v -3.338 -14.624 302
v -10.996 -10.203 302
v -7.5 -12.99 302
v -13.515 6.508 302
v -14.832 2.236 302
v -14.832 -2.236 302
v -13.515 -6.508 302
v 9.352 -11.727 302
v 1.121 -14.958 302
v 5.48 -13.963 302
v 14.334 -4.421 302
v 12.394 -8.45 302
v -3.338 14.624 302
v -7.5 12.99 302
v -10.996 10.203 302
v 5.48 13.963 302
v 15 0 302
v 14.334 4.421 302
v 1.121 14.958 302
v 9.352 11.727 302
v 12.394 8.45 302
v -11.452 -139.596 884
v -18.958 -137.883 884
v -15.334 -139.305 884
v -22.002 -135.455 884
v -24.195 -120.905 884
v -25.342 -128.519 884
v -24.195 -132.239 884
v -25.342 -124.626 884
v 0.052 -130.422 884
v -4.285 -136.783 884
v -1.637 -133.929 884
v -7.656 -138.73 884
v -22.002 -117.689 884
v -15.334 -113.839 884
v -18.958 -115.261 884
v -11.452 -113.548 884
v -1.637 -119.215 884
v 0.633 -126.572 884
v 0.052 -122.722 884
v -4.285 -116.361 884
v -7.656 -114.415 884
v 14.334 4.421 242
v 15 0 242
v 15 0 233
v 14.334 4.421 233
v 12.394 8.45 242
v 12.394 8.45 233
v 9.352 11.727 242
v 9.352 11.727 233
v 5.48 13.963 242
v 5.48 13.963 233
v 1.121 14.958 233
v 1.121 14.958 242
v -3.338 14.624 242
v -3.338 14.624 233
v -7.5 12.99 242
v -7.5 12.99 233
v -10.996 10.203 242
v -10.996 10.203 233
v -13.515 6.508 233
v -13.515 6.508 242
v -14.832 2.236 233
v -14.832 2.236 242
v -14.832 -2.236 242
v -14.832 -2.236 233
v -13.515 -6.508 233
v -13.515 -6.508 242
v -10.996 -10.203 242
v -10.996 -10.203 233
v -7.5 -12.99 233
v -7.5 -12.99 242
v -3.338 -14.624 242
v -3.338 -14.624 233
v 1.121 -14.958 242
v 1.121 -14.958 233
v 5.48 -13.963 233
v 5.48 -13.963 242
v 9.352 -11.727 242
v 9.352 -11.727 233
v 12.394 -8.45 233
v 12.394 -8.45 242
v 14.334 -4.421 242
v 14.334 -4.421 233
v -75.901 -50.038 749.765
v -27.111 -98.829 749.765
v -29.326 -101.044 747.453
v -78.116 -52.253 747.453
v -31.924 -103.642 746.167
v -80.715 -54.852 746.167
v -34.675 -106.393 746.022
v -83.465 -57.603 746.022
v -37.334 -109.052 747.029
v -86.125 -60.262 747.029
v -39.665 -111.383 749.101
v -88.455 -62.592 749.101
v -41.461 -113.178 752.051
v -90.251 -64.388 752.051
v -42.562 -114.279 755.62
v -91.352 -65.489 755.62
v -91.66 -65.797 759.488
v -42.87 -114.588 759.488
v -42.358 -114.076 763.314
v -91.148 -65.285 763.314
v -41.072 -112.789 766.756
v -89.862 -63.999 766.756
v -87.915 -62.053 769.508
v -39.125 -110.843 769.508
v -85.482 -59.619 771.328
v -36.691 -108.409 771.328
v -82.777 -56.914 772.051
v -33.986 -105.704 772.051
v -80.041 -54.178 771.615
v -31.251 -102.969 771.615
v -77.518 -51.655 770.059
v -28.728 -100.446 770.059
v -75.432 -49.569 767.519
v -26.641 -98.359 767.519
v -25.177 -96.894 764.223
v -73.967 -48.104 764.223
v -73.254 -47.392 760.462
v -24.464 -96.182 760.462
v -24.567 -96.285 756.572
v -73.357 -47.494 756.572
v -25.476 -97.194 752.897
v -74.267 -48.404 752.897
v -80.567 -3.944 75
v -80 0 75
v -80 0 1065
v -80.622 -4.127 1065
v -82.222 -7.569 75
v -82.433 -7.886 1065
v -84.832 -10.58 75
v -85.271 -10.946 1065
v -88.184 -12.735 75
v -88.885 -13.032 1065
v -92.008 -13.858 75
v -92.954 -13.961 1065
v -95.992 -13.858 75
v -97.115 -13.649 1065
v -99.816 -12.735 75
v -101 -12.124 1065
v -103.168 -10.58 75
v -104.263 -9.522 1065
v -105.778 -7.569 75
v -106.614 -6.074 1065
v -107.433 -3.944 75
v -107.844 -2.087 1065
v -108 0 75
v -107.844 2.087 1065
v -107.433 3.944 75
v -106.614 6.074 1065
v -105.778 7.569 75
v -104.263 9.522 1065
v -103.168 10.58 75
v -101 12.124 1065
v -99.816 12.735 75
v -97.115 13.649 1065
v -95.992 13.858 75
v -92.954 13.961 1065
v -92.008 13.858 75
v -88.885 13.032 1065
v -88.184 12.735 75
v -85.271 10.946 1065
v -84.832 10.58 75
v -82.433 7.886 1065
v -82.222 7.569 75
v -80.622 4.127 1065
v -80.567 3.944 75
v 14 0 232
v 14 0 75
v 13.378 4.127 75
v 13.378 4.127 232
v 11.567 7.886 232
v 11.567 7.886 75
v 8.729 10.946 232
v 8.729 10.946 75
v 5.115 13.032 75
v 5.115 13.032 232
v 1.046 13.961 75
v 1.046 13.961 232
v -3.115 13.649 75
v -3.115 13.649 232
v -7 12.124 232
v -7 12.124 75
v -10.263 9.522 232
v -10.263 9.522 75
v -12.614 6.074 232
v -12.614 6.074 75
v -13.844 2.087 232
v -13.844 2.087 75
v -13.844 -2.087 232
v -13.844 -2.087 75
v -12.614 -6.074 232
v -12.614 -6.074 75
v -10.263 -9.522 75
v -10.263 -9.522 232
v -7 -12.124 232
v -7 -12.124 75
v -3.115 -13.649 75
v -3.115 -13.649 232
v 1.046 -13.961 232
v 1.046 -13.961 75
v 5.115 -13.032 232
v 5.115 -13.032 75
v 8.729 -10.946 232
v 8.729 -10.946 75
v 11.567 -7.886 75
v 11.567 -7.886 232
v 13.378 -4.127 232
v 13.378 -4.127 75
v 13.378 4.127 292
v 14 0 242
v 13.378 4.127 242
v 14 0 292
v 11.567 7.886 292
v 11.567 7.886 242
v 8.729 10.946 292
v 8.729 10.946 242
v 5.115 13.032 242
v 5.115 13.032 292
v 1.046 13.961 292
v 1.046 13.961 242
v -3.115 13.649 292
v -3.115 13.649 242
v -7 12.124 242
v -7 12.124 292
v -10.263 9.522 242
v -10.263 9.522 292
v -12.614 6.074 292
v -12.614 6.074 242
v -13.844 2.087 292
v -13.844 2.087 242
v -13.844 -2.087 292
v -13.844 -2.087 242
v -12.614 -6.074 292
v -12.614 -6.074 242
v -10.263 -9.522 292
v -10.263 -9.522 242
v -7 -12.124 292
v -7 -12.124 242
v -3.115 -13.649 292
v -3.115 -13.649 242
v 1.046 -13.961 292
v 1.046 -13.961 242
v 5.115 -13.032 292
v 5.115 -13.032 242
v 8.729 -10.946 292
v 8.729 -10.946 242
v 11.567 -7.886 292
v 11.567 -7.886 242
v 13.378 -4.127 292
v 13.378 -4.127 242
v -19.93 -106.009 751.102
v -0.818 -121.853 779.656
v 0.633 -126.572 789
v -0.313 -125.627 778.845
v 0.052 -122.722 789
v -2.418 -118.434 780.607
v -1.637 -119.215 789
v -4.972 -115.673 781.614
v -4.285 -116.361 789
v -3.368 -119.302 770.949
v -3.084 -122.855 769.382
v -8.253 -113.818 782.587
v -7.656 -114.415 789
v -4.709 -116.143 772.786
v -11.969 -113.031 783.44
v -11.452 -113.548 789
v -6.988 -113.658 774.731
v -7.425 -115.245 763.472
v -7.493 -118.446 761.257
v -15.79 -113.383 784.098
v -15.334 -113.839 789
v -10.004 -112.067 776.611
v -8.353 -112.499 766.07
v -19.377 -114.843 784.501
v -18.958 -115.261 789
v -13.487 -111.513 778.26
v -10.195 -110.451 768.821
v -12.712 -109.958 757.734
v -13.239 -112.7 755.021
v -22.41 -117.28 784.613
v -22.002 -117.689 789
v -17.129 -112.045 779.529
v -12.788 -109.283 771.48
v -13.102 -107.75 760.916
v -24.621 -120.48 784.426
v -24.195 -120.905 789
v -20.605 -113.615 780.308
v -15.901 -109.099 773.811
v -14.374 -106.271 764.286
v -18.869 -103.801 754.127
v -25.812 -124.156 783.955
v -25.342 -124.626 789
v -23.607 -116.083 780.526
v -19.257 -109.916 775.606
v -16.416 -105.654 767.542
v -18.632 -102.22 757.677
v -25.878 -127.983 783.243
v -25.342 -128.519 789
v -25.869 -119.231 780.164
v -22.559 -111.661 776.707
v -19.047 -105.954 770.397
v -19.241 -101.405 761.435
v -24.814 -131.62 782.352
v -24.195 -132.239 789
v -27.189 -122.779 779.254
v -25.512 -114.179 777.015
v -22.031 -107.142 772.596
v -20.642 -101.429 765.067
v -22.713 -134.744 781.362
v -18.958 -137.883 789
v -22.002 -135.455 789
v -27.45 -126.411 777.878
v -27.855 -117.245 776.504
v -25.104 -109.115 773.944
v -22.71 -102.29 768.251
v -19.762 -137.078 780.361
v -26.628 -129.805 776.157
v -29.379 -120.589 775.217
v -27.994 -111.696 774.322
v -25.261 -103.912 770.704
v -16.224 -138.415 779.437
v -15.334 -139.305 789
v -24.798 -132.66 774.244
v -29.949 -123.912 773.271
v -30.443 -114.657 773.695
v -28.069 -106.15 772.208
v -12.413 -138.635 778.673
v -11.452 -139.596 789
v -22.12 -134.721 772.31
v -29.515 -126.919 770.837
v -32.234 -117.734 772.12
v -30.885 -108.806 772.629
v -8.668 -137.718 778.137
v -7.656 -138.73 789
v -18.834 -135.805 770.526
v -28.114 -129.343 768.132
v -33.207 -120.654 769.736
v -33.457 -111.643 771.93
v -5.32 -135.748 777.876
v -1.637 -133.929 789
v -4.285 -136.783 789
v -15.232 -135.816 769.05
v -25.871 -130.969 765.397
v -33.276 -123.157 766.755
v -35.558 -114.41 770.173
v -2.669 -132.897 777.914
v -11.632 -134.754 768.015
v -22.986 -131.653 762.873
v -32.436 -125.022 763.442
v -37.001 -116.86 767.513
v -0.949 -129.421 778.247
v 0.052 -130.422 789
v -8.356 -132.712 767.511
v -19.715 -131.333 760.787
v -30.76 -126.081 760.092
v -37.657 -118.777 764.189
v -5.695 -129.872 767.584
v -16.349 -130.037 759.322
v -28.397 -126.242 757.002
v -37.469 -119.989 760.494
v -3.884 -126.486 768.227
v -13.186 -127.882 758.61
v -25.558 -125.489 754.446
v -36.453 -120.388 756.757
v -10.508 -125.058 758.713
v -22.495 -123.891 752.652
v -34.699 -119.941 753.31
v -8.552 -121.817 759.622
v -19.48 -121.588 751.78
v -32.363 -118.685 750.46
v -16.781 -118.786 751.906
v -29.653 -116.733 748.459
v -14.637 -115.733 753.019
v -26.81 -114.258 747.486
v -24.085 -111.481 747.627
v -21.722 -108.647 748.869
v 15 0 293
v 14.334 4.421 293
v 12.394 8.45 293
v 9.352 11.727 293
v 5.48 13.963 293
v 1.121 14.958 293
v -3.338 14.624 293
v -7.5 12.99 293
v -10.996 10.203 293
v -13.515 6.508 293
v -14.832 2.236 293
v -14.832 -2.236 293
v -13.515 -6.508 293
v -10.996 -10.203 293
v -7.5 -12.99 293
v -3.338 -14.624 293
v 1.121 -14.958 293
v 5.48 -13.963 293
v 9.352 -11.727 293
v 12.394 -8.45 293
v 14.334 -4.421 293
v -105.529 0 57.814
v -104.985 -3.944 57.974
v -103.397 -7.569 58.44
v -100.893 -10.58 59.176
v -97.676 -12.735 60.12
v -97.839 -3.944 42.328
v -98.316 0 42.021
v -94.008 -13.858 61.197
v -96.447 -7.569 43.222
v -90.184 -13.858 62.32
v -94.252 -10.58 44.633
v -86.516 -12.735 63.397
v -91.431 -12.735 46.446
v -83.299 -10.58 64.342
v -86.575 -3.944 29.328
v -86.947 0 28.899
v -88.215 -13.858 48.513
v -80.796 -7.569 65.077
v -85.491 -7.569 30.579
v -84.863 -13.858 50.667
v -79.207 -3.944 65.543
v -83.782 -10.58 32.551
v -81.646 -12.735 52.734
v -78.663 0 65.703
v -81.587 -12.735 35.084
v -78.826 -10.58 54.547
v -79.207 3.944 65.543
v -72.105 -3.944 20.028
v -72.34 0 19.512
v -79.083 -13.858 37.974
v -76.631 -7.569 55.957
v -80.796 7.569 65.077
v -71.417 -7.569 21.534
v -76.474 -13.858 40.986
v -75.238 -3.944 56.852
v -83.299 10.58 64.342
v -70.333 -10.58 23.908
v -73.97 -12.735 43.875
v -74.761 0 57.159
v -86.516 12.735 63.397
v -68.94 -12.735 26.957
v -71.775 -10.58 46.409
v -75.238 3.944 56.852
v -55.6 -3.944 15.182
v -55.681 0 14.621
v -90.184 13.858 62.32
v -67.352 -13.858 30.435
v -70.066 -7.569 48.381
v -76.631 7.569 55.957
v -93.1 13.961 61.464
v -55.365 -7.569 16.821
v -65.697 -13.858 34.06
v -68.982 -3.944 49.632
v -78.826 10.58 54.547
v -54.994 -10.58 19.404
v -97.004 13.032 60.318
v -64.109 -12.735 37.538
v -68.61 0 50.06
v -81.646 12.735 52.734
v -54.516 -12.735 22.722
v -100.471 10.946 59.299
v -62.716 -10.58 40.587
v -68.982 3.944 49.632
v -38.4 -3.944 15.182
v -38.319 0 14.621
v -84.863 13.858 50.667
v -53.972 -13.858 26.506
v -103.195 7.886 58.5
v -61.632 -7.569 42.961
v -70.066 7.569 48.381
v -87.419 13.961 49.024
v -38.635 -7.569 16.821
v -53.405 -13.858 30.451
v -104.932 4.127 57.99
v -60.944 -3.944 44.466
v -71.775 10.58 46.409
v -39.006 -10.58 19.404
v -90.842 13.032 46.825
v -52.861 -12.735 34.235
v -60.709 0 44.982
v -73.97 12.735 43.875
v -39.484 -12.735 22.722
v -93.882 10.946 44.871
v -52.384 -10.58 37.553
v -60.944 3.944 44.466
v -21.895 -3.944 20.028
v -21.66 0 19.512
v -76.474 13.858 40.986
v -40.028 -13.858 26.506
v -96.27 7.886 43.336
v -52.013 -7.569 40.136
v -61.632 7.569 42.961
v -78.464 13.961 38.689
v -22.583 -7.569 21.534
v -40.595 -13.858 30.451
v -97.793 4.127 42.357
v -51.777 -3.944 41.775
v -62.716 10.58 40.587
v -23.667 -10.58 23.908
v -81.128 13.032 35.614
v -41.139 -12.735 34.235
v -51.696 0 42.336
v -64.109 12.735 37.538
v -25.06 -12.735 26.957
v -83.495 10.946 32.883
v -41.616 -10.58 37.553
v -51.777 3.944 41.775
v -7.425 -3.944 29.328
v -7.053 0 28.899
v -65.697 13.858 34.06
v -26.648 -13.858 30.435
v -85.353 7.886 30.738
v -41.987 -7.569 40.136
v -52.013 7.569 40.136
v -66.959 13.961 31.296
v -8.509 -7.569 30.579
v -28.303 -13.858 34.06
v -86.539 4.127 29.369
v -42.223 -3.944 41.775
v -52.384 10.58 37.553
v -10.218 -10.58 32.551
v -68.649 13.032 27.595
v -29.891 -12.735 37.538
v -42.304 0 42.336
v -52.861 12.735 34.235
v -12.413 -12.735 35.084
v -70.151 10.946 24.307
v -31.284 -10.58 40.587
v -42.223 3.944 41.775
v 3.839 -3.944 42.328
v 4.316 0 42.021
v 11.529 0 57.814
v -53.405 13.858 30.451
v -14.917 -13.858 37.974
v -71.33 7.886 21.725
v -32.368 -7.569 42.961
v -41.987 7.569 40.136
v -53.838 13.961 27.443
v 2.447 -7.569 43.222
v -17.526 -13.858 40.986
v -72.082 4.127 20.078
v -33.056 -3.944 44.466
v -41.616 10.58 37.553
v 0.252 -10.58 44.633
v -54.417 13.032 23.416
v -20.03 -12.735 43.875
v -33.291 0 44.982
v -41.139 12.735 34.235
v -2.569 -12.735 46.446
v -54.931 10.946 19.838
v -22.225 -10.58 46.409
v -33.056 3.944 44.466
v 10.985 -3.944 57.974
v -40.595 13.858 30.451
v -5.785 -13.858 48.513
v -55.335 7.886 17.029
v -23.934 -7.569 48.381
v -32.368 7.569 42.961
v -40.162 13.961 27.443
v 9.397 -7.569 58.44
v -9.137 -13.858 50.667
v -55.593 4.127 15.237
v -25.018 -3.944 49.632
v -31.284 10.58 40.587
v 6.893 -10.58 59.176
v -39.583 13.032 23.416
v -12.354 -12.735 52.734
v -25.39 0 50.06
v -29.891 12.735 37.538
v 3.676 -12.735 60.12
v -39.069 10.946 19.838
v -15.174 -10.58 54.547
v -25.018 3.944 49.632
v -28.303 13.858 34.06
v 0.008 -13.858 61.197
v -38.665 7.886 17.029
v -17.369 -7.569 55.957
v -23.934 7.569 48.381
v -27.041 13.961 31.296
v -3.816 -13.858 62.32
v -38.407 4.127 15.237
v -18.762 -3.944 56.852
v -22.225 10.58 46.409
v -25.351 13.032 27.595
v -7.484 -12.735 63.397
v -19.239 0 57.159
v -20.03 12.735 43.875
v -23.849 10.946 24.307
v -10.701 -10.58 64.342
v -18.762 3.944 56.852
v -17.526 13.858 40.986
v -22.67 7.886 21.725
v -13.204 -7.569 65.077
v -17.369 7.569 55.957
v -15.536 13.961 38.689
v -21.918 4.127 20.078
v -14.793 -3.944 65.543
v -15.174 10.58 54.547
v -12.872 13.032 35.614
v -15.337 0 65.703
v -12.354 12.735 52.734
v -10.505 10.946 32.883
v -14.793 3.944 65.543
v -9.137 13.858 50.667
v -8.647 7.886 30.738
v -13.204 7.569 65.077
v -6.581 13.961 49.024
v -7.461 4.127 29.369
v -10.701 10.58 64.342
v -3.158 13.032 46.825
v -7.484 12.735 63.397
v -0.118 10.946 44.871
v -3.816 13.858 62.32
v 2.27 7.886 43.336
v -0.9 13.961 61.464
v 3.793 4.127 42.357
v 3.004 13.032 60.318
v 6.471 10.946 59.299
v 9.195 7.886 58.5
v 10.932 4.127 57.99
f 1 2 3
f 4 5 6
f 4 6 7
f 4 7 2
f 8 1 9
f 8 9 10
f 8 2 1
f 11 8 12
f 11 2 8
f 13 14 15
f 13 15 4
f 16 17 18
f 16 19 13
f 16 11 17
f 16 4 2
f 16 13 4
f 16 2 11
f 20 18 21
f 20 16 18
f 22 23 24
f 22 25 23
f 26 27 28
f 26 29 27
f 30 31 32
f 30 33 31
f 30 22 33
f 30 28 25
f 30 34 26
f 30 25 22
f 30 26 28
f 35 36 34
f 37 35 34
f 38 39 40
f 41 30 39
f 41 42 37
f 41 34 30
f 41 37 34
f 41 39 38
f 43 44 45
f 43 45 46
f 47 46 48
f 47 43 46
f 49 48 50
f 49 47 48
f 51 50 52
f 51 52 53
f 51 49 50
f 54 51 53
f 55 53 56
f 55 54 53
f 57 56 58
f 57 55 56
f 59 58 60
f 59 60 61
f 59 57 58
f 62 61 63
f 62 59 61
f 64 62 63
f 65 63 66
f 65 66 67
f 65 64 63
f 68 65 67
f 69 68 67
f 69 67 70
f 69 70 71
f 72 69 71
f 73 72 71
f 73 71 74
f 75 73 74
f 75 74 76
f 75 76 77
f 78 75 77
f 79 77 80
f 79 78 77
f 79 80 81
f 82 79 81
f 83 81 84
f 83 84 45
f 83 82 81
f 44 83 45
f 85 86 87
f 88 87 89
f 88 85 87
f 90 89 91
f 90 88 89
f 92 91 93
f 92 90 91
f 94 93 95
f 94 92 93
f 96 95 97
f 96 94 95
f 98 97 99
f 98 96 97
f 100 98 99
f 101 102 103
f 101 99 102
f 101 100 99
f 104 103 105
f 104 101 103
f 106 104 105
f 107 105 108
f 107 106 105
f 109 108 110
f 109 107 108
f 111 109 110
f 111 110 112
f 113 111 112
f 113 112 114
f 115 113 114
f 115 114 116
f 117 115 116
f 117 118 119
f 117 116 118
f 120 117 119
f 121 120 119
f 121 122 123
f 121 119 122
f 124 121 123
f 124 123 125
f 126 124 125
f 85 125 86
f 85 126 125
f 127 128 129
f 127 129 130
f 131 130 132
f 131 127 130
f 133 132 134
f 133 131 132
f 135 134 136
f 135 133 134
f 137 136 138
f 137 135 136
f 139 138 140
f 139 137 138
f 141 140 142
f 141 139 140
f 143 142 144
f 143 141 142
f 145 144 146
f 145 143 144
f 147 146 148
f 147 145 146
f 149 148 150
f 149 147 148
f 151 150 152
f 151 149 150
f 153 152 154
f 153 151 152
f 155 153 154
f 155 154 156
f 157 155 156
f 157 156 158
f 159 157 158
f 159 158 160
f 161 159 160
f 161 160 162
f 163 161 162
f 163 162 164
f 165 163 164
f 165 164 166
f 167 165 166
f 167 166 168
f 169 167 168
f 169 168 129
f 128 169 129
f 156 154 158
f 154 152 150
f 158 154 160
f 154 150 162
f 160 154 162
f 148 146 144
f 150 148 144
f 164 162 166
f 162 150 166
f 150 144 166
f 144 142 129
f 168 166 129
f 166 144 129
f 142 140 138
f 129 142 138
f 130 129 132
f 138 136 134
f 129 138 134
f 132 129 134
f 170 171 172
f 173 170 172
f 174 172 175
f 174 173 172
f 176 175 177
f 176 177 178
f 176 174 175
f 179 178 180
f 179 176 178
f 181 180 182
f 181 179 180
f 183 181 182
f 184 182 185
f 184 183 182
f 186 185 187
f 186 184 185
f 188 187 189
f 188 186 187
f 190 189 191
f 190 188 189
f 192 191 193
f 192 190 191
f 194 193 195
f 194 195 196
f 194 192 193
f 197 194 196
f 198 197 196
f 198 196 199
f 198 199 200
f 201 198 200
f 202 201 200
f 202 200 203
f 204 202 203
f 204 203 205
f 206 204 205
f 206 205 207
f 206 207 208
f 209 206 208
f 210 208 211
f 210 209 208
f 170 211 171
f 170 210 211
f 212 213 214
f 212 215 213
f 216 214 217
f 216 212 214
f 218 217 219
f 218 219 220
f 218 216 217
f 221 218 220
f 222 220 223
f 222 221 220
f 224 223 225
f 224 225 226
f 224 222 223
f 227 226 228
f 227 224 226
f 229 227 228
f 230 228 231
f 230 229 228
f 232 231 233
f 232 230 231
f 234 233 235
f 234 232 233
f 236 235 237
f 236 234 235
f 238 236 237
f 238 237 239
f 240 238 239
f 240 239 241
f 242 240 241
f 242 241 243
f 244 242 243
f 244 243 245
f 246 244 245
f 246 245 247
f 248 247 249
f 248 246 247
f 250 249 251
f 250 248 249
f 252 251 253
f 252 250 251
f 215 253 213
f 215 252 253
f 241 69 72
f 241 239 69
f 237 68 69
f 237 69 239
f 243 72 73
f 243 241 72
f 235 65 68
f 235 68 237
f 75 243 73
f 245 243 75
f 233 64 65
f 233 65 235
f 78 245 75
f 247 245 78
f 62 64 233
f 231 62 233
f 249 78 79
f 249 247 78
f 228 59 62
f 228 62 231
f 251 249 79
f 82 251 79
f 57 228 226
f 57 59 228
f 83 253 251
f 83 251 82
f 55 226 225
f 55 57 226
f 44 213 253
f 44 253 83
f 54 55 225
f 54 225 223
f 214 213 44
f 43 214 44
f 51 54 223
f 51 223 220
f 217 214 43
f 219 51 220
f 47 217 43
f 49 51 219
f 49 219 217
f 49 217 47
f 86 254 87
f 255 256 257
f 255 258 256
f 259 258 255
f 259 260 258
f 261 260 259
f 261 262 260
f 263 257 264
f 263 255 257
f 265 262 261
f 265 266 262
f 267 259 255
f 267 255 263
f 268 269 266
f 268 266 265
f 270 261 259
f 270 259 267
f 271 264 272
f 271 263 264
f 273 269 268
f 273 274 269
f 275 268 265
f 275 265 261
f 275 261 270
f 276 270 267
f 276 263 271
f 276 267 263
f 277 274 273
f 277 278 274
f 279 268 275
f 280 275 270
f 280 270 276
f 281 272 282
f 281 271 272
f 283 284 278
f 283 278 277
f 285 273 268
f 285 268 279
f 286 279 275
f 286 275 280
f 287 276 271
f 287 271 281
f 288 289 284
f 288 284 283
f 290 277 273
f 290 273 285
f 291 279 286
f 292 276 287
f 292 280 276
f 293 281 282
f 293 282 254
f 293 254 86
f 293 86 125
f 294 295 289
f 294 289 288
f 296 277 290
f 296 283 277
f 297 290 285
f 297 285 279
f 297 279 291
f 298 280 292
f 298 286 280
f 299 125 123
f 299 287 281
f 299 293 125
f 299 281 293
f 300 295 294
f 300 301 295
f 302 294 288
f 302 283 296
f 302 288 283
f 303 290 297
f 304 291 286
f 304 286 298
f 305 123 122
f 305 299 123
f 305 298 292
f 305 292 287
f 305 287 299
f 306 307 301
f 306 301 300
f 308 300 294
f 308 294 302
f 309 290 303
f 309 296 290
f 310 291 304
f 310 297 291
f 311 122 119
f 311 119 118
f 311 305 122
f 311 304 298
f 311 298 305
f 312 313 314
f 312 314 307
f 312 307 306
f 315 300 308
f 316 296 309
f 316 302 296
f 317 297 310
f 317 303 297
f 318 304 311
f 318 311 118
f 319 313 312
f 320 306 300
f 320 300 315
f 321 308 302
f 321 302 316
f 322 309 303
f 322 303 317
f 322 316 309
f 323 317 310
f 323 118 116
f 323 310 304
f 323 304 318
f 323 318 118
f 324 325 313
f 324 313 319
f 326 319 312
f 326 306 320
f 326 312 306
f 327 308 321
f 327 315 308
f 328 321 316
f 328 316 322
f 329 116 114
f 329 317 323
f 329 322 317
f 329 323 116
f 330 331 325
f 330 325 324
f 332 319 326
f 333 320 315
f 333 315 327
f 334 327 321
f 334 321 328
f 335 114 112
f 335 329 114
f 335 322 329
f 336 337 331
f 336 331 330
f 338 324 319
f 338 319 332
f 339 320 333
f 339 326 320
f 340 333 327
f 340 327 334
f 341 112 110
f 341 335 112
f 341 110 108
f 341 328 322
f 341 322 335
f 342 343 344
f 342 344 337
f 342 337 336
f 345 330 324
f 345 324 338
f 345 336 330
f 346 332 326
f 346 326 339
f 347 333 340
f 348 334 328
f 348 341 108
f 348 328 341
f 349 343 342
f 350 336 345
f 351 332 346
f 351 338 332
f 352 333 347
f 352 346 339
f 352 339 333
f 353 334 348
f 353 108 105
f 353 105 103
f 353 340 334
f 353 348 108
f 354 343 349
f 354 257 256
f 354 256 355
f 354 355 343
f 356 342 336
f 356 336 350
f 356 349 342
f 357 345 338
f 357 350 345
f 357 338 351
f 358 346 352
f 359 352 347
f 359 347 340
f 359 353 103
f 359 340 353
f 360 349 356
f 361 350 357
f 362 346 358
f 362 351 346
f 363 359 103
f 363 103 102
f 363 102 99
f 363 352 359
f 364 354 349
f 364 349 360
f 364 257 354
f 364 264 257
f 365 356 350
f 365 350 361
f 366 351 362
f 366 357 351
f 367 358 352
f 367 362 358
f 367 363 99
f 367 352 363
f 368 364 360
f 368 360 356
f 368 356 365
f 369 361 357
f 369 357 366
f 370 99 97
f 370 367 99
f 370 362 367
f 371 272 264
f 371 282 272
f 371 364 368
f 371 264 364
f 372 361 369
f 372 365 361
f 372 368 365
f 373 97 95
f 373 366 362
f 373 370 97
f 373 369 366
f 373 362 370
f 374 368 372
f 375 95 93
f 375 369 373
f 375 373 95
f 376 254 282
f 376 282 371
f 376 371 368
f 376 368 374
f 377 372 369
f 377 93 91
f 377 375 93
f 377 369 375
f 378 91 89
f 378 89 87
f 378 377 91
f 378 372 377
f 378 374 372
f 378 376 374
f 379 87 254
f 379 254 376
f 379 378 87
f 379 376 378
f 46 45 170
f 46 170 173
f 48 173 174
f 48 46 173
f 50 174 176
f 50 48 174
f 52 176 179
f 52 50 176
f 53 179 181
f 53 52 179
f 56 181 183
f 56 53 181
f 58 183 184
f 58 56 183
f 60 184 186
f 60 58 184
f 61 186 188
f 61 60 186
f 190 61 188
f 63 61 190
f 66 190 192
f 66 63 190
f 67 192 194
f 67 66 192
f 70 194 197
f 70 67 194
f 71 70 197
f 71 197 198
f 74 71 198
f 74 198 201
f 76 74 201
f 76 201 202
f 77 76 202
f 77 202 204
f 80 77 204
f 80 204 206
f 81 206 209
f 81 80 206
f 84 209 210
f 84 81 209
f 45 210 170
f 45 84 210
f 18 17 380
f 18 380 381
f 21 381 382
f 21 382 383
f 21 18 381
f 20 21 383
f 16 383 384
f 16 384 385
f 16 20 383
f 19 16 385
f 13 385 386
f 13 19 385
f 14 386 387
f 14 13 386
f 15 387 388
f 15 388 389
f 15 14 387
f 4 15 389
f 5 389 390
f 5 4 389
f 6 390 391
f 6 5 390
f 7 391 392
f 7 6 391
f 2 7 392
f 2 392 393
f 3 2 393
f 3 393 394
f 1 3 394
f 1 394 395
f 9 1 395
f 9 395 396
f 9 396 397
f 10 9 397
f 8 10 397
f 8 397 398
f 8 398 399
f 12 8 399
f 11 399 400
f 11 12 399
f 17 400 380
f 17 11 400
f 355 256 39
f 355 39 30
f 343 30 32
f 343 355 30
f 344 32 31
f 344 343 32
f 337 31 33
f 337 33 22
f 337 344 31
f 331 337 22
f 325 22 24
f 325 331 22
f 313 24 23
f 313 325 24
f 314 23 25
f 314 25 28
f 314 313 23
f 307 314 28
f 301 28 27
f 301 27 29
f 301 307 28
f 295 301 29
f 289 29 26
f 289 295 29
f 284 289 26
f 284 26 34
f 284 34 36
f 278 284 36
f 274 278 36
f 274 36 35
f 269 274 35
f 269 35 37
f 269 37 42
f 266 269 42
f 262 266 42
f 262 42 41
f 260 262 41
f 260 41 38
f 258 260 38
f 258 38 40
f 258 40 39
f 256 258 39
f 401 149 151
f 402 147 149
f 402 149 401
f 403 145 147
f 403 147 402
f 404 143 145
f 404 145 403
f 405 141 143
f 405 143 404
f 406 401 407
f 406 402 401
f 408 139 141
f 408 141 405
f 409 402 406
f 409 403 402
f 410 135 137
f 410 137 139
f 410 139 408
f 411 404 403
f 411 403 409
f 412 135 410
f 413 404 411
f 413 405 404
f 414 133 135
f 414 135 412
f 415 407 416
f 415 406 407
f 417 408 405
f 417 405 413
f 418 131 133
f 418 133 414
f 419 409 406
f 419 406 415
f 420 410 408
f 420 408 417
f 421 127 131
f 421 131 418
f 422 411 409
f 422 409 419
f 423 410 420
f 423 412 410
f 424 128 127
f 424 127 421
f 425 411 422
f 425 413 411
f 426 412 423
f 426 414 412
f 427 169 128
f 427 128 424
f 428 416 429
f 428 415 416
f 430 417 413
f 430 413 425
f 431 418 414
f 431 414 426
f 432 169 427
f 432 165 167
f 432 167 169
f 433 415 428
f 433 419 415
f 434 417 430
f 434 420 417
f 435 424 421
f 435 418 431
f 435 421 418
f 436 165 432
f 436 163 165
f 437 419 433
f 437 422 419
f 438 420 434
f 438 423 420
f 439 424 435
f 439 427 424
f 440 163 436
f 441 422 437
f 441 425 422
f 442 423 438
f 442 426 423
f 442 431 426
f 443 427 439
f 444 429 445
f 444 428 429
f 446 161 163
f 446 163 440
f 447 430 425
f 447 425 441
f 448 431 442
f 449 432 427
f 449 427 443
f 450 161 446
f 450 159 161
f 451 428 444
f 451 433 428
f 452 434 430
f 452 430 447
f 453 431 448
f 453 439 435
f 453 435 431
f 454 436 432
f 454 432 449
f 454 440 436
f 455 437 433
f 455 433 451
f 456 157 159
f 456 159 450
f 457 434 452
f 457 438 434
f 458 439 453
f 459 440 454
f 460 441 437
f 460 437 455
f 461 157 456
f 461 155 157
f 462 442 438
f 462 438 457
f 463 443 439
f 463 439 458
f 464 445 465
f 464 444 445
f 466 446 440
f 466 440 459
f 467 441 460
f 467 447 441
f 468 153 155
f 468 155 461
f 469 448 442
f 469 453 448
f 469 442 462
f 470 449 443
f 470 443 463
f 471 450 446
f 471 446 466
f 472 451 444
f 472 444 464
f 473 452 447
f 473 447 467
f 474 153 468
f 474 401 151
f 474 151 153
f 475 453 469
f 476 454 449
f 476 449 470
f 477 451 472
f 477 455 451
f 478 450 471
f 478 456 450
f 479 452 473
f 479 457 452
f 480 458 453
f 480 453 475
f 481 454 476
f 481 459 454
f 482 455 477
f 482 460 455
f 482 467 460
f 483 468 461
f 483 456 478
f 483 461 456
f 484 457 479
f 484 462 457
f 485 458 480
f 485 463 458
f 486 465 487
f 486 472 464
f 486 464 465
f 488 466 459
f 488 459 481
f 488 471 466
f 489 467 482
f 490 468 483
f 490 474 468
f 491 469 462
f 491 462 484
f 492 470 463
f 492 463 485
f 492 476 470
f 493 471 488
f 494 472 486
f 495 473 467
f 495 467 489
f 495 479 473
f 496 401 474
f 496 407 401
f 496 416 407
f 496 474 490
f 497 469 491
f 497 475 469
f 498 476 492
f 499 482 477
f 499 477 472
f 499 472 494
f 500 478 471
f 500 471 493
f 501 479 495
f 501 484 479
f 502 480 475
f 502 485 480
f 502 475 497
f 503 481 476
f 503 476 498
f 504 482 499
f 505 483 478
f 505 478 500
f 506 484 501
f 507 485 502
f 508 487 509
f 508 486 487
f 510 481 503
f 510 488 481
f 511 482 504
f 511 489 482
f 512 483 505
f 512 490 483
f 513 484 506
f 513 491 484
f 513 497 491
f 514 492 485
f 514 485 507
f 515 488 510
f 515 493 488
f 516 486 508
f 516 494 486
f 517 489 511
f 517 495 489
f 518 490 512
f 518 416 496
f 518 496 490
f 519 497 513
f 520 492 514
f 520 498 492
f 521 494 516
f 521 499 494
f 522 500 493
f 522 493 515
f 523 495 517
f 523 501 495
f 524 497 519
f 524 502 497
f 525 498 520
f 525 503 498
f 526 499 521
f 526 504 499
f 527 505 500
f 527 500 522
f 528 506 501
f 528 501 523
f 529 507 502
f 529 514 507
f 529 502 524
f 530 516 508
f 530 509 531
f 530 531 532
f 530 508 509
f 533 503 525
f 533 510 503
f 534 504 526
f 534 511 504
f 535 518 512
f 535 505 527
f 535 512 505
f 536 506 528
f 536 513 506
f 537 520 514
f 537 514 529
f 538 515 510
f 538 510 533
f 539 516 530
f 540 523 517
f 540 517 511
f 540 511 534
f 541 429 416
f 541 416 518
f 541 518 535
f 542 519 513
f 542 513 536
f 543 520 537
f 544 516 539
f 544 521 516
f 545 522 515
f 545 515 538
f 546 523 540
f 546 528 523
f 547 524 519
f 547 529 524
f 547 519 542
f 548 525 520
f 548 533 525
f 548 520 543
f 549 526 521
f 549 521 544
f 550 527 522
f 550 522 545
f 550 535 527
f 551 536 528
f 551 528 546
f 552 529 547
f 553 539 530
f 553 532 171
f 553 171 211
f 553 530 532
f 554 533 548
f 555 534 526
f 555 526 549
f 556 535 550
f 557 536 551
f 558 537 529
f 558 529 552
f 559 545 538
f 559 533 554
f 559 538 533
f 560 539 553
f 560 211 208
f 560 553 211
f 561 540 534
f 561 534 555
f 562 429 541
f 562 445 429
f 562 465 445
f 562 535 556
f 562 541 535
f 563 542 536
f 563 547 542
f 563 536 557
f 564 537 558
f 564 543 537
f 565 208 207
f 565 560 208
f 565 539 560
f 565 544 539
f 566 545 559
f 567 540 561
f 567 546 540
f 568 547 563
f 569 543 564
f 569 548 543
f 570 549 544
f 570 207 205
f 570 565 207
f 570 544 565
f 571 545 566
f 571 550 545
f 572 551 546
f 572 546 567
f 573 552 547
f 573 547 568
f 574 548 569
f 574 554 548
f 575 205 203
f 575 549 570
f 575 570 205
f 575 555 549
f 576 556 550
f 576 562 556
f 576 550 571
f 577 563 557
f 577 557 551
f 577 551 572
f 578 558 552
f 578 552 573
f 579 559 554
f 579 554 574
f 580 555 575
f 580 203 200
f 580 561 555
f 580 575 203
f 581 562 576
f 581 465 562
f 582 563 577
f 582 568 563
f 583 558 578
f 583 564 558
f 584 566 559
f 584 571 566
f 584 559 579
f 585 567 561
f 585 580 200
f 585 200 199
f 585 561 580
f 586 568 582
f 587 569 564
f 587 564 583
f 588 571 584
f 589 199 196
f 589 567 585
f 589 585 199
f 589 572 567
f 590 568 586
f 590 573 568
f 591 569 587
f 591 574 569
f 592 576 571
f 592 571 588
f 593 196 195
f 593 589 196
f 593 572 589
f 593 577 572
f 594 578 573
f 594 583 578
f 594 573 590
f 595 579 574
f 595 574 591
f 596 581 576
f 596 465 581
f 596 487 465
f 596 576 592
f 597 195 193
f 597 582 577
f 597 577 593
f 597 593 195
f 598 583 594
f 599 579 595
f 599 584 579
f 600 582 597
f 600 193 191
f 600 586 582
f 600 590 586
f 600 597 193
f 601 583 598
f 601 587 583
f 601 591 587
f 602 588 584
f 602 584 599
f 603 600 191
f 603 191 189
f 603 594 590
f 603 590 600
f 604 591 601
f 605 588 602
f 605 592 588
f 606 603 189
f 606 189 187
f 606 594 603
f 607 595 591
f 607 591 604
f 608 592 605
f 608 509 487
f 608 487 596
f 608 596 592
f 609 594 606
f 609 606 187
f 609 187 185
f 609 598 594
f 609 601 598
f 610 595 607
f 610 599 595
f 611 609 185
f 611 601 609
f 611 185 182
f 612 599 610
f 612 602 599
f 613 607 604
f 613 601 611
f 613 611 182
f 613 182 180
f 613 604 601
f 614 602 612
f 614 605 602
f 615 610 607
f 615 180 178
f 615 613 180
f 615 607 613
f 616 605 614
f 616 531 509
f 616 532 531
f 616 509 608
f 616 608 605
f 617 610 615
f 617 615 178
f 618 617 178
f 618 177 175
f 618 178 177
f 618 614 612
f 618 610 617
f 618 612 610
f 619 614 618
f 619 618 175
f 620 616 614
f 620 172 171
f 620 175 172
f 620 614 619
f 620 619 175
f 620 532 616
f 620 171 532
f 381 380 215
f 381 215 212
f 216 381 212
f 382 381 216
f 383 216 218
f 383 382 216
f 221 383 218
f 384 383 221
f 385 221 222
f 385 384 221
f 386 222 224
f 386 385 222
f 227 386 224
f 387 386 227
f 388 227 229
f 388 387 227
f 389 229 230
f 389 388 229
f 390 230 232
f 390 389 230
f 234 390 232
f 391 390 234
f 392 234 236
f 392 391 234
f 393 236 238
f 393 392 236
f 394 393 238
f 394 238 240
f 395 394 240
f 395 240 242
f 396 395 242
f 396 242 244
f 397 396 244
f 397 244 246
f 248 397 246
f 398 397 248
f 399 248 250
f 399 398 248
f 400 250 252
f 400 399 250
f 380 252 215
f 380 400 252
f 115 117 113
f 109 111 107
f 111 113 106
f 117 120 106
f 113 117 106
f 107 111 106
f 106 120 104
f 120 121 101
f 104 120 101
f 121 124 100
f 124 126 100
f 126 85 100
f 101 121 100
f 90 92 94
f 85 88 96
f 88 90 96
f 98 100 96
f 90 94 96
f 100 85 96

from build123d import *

# Parameters (mm, degrees)
F4_SIZE   = 0.99999
F6_R      = 14
F7_DEPTH  = 990
F3_FACE_R = 14
F11_R     = 13.0604129179


# Not quite as in the source:
# - a fillet or chamfer is up to 0.001 mm smaller than in the source, because OpenCascade refuses the exact size


with BuildPart() as f3:
    # F2 (on Front) → F3 (revolve)
    with BuildSketch(Plane.XZ):
        Polygon((0, 302), (0, 75), (14, 75), (14, 232), (15, 232), (15, 242), (14, 242), (14, 292), (15, 292), (15, 302), align=None)
    revolve(axis=Axis((0, 0, 188.5), (0, 0, 1)))

    # F4 (size 1 in the source; OpenCascade refuses exactly that, so slightly less here)
    f4_edges = [f3.edges().sort_by_distance(p)[0] for p in [
        (-15, 0, 232),
        (-15, 0, 292),
    ]]
    chamfer(f4_edges, length=F4_SIZE)



with BuildPart() as f7:
    # F6 (on face) → F7 (new body)
    with BuildSketch(Plane(origin=(0, 0, 75), x_dir=(1, 0, 0), z_dir=(0, 0, -1))):
        with Locations((-94, 0)):
            Circle(F6_R)
    extrude(amount=-F7_DEPTH)


with BuildPart() as f3_1:
    add(f3.part)

    add(f7.part)  # F9 merges F7
    # F9: sweep along a path in F8
    with BuildLine(Plane.XZ) as f9_path:
        ThreePointArc((-94, 75), (-47, 28), (0, 75))
    # F3_face (on face) → F9 (sweep)
    with BuildSketch(Plane(origin=(0, 0, 75), x_dir=(1, 0, 0), z_dir=(0, 0, -1))):
        Circle(F3_FACE_R)
    sweep(path=f9_path.line)


with BuildPart() as f14:
    # F14: sweep along a path in F13
    with BuildLine(Plane(origin=(-69.5, -69.5, 0), x_dir=(-0.7071067812, 0.7071067812, 0), z_dir=(0.7071067812, 0.7071067812, 0))) as f14_path:
        Line((-80.7121574151, 884), (-80.7121574151, 789))
        ThreePointArc((-80.7121574151, 789), (-71.9253608507, 767.7867965644), (-50.7121574151, 759))
        Line((-50.7121574151, 759), (18.2878425849, 759))
    # F11 (on offset) → F14 (sweep)
    with BuildSketch(Plane.XY.offset(884)):
        with Locations((-12.4278861676, -126.5721138324)):
            Circle(F11_R)
    sweep(path=f14_path.line)


solid = Compound([f3_1.part, f14.part])
